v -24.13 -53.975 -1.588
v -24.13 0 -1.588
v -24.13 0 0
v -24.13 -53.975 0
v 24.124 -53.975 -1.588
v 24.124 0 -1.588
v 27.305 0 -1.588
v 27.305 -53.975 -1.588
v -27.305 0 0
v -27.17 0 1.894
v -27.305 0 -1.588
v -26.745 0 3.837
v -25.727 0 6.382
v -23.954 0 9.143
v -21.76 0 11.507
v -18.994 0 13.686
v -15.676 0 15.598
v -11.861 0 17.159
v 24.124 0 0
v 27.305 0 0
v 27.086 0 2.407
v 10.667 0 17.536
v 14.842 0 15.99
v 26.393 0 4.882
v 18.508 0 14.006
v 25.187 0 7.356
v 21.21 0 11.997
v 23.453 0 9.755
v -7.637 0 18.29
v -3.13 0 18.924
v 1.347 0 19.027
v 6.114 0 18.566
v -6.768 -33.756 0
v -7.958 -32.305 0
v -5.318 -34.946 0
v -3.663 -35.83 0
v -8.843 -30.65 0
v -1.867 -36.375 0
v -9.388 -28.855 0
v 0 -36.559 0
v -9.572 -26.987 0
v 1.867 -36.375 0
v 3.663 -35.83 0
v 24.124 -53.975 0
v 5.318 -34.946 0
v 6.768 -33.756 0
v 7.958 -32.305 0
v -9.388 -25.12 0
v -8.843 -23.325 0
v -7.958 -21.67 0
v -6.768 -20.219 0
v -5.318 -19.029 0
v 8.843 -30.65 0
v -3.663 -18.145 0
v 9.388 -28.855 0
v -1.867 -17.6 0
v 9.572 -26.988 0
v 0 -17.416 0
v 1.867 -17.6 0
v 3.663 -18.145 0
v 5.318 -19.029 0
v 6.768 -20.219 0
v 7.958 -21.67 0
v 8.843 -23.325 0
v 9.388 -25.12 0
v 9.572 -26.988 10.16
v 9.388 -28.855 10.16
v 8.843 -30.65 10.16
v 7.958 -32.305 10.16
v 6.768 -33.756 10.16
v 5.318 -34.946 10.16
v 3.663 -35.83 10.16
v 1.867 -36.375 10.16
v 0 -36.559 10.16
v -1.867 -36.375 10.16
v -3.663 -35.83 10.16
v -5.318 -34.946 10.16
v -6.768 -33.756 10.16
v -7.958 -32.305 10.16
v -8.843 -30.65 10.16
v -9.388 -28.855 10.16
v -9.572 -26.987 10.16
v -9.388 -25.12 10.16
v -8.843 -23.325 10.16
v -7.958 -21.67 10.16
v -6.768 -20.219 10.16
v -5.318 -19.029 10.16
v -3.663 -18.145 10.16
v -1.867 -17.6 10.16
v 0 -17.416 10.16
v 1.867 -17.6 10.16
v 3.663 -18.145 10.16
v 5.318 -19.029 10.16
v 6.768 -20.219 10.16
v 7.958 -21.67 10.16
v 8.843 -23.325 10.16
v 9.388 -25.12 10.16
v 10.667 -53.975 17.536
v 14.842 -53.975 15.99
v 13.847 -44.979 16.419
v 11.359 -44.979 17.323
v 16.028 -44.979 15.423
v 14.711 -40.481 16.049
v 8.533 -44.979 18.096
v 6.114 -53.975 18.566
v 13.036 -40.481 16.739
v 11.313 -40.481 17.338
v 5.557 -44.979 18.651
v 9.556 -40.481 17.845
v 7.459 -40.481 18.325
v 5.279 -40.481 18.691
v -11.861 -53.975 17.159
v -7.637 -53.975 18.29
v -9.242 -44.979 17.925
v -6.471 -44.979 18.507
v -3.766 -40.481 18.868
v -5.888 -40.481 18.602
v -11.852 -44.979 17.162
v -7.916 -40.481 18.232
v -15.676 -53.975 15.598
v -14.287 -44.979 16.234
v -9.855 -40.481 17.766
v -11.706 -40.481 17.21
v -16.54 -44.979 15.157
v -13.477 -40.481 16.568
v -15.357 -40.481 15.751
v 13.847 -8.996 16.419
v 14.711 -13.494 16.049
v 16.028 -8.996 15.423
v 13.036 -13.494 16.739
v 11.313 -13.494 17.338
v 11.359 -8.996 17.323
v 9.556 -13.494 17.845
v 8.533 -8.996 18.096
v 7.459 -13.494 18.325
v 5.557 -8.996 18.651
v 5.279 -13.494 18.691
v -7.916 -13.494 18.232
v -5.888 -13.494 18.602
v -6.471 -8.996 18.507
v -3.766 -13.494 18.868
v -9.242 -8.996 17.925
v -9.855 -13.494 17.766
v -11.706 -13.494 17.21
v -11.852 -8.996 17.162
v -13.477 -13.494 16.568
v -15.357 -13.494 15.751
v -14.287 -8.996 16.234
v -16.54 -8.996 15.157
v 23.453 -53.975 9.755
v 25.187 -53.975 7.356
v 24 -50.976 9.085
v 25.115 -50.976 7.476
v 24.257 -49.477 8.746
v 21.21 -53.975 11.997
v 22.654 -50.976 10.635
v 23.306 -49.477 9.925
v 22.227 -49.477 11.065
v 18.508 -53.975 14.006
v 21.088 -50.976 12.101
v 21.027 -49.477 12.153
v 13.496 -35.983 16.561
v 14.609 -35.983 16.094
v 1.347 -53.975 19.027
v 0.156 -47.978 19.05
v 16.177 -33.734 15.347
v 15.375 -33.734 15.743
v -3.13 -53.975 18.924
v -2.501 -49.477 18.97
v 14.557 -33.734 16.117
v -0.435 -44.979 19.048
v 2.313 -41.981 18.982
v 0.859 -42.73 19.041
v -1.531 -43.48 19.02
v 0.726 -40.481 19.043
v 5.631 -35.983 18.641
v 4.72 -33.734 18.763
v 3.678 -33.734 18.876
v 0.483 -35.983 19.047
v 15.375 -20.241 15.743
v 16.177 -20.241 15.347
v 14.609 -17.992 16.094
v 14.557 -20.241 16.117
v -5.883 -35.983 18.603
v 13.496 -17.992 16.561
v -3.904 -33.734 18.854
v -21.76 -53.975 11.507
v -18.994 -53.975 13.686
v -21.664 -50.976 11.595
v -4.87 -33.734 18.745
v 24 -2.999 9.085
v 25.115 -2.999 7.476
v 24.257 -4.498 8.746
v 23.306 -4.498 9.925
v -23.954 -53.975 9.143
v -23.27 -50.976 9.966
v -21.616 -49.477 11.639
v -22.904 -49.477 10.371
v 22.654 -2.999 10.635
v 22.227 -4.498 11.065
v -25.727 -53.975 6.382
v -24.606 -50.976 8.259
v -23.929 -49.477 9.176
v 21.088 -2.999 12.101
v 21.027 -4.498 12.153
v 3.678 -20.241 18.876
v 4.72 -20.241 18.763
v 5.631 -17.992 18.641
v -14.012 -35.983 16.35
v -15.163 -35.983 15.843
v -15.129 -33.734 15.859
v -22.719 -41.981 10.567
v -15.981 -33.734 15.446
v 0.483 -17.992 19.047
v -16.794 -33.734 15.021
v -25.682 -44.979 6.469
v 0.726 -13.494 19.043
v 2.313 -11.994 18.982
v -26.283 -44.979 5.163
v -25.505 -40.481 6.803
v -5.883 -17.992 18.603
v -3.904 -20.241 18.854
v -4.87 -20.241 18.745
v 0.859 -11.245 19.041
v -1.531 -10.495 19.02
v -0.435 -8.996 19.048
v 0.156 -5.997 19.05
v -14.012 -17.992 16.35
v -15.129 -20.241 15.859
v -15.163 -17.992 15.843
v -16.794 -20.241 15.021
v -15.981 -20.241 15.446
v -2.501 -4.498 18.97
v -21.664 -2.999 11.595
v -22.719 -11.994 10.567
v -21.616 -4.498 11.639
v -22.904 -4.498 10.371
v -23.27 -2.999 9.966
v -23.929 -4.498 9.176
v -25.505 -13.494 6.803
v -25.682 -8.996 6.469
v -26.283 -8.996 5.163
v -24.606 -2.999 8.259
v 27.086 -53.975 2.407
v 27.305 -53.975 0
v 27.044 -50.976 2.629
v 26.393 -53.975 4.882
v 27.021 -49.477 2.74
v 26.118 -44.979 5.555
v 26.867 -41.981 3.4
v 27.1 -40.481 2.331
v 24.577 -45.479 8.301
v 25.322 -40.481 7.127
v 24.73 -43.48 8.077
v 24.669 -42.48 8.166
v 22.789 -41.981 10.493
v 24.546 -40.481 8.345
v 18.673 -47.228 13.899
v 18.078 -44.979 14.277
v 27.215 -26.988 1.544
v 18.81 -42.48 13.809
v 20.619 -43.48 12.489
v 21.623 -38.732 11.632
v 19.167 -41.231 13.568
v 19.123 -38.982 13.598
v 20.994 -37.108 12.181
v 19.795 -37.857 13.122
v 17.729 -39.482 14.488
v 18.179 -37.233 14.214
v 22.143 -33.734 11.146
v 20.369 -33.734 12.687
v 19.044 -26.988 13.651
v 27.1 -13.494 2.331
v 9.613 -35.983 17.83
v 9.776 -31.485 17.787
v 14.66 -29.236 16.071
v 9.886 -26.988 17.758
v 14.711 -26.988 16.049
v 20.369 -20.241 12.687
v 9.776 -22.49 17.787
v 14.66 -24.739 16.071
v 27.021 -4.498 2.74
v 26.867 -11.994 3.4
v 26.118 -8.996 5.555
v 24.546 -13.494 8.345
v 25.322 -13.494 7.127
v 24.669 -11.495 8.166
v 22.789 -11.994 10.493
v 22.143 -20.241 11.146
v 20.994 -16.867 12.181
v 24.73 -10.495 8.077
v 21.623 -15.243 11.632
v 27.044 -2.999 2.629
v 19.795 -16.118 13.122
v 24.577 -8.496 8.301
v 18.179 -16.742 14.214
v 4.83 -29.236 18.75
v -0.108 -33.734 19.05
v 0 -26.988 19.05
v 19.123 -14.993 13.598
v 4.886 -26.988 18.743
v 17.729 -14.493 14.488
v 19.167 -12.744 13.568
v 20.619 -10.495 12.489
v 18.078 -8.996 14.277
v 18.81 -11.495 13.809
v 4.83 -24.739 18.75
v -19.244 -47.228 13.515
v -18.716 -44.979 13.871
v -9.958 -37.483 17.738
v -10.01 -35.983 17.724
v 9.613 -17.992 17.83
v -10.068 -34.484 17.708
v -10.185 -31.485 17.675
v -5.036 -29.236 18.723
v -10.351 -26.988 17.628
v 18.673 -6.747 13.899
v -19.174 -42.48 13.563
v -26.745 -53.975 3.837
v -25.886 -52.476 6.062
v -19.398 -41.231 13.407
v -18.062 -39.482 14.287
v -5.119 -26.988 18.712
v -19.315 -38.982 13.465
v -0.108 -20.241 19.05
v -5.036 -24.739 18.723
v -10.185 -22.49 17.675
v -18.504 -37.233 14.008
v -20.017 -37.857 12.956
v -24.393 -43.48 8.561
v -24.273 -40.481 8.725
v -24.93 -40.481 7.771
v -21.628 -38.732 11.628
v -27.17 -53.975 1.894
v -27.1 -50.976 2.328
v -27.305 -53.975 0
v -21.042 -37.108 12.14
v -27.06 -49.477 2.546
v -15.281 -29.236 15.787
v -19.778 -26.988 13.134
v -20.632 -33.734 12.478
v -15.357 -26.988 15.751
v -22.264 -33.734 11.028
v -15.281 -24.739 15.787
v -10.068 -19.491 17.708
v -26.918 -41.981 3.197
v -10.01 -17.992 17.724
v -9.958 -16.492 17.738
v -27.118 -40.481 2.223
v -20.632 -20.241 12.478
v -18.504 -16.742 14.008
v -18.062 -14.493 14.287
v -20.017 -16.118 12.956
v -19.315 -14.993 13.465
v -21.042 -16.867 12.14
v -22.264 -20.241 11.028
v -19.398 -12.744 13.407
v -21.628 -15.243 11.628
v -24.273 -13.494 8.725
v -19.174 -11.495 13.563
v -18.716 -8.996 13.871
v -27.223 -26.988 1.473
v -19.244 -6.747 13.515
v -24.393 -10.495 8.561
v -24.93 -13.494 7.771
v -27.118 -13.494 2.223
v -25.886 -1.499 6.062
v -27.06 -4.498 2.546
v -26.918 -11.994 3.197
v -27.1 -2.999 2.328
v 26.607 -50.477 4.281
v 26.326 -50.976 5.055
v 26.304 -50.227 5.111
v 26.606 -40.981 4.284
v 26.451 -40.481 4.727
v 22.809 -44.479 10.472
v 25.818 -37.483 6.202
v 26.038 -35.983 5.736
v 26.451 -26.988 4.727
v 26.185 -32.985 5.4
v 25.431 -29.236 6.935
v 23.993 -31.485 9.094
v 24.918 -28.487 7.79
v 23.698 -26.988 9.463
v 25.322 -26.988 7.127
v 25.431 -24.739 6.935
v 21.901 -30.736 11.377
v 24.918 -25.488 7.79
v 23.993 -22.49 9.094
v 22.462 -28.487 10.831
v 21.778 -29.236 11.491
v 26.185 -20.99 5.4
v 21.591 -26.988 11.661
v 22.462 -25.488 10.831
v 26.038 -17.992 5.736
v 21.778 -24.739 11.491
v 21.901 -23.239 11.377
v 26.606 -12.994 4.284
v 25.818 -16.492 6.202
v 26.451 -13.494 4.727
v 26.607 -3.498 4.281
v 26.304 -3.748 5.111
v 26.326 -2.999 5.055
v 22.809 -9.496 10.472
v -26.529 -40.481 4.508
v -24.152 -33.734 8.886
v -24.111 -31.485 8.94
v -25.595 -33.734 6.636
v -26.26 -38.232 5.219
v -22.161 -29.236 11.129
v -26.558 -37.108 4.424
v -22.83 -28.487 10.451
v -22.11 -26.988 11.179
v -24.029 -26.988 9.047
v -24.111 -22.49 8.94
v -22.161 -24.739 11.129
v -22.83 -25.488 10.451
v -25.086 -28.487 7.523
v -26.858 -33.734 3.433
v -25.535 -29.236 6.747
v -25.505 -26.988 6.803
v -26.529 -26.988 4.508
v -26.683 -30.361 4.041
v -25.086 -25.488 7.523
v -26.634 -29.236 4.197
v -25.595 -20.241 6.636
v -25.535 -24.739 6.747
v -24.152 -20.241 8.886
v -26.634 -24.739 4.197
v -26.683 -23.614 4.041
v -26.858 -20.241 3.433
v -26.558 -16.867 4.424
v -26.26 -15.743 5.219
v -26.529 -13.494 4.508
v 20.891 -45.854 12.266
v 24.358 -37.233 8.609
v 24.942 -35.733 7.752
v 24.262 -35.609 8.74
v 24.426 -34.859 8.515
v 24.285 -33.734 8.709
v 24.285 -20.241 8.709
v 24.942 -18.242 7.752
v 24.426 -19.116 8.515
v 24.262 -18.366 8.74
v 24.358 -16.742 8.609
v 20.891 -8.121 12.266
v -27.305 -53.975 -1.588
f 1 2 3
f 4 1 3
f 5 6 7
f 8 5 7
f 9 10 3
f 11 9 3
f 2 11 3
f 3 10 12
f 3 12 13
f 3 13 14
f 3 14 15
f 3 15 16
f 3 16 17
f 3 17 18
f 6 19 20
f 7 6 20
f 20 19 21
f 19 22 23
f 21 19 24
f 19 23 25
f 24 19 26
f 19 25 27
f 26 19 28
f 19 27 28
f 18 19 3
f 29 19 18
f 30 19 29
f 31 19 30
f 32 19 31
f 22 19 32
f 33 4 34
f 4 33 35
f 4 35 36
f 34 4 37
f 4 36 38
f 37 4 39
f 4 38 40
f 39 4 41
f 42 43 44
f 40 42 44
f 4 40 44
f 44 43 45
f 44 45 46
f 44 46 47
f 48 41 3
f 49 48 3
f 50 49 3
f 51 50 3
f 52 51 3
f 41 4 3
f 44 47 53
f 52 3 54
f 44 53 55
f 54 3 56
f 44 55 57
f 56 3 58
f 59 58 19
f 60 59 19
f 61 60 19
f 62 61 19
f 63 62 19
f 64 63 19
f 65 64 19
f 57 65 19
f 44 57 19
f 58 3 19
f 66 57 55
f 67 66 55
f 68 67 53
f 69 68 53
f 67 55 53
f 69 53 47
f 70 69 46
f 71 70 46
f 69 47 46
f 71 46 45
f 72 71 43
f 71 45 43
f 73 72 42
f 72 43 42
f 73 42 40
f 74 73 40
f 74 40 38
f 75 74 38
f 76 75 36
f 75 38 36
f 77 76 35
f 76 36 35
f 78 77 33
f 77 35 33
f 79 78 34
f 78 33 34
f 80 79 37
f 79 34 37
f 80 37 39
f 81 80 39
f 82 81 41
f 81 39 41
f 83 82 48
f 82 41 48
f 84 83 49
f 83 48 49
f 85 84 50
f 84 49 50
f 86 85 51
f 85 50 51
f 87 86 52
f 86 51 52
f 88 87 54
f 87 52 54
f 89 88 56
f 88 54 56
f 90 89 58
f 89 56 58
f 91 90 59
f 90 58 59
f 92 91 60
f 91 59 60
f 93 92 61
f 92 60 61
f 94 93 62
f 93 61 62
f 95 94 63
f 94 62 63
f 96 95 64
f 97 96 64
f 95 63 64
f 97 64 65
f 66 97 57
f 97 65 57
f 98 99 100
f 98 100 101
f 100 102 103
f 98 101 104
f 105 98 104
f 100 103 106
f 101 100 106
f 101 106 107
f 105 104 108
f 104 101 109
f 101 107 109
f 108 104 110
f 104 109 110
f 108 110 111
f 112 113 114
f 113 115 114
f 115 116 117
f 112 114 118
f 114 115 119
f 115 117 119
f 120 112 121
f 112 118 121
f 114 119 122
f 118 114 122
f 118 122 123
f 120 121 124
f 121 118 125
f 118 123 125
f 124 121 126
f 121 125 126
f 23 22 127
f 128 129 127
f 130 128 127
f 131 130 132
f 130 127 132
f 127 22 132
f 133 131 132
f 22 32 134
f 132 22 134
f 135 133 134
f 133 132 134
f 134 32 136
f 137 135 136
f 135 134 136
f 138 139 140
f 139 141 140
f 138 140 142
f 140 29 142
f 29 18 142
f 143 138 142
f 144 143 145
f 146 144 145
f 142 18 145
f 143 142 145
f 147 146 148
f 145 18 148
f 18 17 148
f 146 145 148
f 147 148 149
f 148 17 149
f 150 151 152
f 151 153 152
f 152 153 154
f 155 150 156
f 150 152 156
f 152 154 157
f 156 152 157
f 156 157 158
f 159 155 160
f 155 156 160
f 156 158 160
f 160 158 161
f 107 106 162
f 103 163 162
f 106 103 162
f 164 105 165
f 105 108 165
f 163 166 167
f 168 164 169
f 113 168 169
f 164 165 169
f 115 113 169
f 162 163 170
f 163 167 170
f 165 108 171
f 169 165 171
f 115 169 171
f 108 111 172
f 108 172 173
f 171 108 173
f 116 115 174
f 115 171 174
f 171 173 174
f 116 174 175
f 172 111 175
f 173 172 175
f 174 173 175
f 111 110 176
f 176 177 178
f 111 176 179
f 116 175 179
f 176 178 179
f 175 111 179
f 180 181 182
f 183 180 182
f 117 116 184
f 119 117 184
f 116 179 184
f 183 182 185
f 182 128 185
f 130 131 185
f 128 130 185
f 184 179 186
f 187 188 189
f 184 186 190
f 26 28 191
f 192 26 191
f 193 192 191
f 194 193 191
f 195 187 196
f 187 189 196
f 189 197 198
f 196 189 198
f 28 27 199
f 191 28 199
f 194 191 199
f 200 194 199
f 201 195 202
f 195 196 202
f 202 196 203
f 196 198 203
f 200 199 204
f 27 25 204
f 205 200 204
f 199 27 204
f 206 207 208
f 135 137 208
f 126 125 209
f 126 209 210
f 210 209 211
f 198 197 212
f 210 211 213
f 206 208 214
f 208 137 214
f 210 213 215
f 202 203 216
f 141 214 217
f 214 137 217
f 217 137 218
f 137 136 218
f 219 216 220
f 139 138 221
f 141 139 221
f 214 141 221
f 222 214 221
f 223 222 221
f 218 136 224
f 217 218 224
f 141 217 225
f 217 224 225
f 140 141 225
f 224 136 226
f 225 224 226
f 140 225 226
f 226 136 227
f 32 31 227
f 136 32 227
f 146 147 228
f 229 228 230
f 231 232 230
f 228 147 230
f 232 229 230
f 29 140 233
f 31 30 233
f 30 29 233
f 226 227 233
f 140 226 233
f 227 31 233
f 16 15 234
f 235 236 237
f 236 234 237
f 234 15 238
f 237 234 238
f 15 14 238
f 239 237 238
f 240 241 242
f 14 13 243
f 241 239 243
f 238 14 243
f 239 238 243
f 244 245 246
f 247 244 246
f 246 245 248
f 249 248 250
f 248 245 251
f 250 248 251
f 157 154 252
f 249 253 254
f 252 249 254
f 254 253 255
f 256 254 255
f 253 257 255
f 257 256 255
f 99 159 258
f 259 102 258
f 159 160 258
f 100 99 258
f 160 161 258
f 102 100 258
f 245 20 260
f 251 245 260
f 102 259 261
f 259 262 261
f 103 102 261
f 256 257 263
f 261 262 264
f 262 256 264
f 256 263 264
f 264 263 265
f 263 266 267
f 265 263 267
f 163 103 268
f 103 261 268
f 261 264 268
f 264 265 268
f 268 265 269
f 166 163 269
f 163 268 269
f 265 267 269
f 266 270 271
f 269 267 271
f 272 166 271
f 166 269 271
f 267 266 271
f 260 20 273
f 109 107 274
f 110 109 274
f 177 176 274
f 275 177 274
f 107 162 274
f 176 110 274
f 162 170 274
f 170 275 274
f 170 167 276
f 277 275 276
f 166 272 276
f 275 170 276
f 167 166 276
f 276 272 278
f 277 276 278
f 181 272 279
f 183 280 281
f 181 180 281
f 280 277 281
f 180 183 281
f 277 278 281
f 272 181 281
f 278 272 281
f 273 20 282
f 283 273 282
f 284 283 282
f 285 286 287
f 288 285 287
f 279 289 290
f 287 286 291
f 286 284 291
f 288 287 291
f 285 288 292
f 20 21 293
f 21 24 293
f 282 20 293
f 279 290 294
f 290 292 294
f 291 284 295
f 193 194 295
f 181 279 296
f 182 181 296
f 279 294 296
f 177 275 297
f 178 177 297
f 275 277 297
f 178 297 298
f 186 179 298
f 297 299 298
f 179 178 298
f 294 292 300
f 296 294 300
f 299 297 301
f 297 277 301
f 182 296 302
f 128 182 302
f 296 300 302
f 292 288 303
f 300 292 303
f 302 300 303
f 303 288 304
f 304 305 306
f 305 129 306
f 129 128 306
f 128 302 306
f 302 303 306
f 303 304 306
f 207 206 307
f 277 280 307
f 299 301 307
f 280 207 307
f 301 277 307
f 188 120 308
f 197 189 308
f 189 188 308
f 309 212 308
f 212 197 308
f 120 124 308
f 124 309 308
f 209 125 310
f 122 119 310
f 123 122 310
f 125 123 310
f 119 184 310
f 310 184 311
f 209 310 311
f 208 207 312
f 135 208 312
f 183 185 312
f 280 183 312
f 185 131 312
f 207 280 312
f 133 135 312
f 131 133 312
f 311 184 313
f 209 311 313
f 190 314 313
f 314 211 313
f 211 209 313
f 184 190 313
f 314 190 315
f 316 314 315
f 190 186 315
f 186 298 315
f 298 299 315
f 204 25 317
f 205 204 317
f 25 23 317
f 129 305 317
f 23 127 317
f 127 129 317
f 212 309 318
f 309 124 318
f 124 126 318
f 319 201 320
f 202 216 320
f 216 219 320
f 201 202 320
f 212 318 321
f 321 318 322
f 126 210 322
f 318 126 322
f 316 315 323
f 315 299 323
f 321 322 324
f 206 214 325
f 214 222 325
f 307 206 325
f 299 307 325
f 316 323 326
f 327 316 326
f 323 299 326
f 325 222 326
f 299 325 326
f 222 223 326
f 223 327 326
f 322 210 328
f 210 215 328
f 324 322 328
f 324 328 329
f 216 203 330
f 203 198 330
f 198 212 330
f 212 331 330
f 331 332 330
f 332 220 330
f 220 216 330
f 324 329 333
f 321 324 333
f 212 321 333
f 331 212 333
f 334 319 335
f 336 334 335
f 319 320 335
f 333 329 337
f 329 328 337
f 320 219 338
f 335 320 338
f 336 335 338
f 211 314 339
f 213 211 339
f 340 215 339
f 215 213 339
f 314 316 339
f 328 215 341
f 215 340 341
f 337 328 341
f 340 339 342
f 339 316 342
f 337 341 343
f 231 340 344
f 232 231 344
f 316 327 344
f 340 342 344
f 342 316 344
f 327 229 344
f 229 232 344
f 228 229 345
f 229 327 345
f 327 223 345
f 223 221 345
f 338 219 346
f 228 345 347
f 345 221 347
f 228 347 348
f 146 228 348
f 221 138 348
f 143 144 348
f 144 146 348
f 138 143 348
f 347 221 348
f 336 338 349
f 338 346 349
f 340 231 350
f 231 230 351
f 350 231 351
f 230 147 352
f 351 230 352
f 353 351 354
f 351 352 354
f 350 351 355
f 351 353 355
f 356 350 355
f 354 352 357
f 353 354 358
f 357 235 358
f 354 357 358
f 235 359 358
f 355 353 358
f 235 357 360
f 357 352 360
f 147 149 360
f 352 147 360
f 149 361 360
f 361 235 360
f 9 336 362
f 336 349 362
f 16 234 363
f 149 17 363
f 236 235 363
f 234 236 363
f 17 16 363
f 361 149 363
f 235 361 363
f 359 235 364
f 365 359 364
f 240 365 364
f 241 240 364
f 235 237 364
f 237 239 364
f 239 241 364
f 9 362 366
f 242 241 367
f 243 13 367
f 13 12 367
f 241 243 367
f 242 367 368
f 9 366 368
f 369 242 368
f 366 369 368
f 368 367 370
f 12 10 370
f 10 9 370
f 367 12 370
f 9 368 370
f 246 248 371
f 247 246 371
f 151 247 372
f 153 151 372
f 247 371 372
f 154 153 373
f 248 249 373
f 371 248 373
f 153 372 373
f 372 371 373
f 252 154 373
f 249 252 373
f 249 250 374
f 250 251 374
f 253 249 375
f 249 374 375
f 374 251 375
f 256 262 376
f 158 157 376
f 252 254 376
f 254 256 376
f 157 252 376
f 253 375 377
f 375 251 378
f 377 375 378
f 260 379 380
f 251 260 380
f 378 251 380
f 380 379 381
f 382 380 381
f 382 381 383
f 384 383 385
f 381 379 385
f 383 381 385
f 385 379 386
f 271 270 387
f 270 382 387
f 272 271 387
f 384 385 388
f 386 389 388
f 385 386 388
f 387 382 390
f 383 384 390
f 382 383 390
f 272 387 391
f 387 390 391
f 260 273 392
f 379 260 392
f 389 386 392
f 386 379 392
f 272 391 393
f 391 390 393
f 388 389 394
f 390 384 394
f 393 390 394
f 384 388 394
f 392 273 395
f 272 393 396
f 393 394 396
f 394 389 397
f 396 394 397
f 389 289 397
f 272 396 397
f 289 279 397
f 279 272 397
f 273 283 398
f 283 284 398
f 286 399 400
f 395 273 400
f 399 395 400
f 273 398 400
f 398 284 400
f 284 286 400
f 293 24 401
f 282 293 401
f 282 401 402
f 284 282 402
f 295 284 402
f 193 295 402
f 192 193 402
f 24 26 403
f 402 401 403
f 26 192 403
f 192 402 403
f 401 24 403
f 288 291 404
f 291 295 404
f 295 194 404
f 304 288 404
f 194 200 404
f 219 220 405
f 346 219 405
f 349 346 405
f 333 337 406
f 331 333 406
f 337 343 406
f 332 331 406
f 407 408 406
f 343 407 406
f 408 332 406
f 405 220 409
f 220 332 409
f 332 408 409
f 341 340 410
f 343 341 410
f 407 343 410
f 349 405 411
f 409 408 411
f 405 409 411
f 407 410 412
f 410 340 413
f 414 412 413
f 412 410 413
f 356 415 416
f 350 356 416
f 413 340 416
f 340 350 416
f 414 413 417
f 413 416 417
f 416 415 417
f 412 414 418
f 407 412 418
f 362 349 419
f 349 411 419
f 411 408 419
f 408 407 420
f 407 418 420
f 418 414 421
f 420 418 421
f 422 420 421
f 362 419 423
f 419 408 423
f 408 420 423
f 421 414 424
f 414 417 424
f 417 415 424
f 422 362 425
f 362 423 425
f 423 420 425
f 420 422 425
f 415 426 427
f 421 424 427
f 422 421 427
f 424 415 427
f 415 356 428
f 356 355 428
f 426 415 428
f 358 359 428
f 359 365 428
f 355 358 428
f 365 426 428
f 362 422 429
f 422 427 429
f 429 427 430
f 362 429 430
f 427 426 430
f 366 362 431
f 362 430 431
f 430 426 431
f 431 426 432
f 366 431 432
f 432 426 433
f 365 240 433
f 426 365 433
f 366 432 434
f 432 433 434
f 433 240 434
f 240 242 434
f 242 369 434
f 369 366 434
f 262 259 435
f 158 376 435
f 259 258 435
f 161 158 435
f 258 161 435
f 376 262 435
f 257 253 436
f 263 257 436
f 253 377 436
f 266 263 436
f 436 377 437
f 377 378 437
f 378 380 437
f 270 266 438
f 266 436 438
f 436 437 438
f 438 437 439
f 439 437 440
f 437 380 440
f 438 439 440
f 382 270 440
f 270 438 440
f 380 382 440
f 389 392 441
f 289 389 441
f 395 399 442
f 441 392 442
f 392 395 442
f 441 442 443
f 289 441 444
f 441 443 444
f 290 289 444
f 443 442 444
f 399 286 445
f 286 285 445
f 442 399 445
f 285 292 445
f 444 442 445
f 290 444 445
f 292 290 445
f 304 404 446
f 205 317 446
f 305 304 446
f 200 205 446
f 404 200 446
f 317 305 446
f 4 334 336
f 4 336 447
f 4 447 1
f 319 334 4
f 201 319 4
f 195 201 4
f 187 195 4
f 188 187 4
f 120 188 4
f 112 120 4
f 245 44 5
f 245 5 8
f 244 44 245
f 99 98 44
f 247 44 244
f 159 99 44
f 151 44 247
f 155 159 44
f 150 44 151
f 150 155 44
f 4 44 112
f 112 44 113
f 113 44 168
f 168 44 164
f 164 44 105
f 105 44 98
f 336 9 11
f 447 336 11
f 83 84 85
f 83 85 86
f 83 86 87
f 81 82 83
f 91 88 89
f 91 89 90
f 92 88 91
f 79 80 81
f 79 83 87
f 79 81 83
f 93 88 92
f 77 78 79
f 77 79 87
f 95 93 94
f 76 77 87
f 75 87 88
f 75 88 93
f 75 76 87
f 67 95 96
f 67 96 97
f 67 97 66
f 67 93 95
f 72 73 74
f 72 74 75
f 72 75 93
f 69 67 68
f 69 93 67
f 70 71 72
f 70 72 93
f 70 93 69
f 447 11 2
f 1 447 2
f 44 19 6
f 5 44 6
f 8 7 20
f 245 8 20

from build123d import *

# Parameters (mm, degrees)
F1_DEPTH = 53.975
F2_R     = 9.5715122456
F3_DEPTH = 10.16


with BuildPart() as f1:
    # F0 (on Front) → F1 (new body)
    with BuildSketch(Plane.XZ):
        with BuildLine():
            Line((27.305, -1.5875), (27.305, 0))
            add(Edge.make_bspline(
                [(27.305, 0), (27.305, 19.05), (0, 19.05), (-27.305, 19.05), (-27.305, 0)],
                knots=[0, 0, 0, 1.5707963268, 1.5707963268, 3.1415926536, 3.1415926536, 3.1415926536], degree=2, weights=[1, 0.7071067812, 1, 0.7071067812, 1]))
            Line((-27.305, 0), (-27.305, -1.5875))
            Line((-27.305, -1.5875), (-24.13, -1.5875))
            Line((-24.13, -1.5875), (-24.13, 0))
            Line((-24.13, 0), (24.1236202419, 0))
            Line((24.1236202419, 0), (24.1236202419, -1.5875))
            Line((24.1236202419, -1.5875), (27.305, -1.5875))
        make_face()
    extrude(amount=F1_DEPTH)

    # F2 (on face) → F3 (cut)
    with BuildSketch(Plane(origin=(0, 0, 0), x_dir=(1, 0, 0), z_dir=(0, 0, -1))):
        with Locations((0, 26.9875)):
            Circle(F2_R)
    extrude(amount=-F3_DEPTH, mode=Mode.SUBTRACT)


solid = f1.part
